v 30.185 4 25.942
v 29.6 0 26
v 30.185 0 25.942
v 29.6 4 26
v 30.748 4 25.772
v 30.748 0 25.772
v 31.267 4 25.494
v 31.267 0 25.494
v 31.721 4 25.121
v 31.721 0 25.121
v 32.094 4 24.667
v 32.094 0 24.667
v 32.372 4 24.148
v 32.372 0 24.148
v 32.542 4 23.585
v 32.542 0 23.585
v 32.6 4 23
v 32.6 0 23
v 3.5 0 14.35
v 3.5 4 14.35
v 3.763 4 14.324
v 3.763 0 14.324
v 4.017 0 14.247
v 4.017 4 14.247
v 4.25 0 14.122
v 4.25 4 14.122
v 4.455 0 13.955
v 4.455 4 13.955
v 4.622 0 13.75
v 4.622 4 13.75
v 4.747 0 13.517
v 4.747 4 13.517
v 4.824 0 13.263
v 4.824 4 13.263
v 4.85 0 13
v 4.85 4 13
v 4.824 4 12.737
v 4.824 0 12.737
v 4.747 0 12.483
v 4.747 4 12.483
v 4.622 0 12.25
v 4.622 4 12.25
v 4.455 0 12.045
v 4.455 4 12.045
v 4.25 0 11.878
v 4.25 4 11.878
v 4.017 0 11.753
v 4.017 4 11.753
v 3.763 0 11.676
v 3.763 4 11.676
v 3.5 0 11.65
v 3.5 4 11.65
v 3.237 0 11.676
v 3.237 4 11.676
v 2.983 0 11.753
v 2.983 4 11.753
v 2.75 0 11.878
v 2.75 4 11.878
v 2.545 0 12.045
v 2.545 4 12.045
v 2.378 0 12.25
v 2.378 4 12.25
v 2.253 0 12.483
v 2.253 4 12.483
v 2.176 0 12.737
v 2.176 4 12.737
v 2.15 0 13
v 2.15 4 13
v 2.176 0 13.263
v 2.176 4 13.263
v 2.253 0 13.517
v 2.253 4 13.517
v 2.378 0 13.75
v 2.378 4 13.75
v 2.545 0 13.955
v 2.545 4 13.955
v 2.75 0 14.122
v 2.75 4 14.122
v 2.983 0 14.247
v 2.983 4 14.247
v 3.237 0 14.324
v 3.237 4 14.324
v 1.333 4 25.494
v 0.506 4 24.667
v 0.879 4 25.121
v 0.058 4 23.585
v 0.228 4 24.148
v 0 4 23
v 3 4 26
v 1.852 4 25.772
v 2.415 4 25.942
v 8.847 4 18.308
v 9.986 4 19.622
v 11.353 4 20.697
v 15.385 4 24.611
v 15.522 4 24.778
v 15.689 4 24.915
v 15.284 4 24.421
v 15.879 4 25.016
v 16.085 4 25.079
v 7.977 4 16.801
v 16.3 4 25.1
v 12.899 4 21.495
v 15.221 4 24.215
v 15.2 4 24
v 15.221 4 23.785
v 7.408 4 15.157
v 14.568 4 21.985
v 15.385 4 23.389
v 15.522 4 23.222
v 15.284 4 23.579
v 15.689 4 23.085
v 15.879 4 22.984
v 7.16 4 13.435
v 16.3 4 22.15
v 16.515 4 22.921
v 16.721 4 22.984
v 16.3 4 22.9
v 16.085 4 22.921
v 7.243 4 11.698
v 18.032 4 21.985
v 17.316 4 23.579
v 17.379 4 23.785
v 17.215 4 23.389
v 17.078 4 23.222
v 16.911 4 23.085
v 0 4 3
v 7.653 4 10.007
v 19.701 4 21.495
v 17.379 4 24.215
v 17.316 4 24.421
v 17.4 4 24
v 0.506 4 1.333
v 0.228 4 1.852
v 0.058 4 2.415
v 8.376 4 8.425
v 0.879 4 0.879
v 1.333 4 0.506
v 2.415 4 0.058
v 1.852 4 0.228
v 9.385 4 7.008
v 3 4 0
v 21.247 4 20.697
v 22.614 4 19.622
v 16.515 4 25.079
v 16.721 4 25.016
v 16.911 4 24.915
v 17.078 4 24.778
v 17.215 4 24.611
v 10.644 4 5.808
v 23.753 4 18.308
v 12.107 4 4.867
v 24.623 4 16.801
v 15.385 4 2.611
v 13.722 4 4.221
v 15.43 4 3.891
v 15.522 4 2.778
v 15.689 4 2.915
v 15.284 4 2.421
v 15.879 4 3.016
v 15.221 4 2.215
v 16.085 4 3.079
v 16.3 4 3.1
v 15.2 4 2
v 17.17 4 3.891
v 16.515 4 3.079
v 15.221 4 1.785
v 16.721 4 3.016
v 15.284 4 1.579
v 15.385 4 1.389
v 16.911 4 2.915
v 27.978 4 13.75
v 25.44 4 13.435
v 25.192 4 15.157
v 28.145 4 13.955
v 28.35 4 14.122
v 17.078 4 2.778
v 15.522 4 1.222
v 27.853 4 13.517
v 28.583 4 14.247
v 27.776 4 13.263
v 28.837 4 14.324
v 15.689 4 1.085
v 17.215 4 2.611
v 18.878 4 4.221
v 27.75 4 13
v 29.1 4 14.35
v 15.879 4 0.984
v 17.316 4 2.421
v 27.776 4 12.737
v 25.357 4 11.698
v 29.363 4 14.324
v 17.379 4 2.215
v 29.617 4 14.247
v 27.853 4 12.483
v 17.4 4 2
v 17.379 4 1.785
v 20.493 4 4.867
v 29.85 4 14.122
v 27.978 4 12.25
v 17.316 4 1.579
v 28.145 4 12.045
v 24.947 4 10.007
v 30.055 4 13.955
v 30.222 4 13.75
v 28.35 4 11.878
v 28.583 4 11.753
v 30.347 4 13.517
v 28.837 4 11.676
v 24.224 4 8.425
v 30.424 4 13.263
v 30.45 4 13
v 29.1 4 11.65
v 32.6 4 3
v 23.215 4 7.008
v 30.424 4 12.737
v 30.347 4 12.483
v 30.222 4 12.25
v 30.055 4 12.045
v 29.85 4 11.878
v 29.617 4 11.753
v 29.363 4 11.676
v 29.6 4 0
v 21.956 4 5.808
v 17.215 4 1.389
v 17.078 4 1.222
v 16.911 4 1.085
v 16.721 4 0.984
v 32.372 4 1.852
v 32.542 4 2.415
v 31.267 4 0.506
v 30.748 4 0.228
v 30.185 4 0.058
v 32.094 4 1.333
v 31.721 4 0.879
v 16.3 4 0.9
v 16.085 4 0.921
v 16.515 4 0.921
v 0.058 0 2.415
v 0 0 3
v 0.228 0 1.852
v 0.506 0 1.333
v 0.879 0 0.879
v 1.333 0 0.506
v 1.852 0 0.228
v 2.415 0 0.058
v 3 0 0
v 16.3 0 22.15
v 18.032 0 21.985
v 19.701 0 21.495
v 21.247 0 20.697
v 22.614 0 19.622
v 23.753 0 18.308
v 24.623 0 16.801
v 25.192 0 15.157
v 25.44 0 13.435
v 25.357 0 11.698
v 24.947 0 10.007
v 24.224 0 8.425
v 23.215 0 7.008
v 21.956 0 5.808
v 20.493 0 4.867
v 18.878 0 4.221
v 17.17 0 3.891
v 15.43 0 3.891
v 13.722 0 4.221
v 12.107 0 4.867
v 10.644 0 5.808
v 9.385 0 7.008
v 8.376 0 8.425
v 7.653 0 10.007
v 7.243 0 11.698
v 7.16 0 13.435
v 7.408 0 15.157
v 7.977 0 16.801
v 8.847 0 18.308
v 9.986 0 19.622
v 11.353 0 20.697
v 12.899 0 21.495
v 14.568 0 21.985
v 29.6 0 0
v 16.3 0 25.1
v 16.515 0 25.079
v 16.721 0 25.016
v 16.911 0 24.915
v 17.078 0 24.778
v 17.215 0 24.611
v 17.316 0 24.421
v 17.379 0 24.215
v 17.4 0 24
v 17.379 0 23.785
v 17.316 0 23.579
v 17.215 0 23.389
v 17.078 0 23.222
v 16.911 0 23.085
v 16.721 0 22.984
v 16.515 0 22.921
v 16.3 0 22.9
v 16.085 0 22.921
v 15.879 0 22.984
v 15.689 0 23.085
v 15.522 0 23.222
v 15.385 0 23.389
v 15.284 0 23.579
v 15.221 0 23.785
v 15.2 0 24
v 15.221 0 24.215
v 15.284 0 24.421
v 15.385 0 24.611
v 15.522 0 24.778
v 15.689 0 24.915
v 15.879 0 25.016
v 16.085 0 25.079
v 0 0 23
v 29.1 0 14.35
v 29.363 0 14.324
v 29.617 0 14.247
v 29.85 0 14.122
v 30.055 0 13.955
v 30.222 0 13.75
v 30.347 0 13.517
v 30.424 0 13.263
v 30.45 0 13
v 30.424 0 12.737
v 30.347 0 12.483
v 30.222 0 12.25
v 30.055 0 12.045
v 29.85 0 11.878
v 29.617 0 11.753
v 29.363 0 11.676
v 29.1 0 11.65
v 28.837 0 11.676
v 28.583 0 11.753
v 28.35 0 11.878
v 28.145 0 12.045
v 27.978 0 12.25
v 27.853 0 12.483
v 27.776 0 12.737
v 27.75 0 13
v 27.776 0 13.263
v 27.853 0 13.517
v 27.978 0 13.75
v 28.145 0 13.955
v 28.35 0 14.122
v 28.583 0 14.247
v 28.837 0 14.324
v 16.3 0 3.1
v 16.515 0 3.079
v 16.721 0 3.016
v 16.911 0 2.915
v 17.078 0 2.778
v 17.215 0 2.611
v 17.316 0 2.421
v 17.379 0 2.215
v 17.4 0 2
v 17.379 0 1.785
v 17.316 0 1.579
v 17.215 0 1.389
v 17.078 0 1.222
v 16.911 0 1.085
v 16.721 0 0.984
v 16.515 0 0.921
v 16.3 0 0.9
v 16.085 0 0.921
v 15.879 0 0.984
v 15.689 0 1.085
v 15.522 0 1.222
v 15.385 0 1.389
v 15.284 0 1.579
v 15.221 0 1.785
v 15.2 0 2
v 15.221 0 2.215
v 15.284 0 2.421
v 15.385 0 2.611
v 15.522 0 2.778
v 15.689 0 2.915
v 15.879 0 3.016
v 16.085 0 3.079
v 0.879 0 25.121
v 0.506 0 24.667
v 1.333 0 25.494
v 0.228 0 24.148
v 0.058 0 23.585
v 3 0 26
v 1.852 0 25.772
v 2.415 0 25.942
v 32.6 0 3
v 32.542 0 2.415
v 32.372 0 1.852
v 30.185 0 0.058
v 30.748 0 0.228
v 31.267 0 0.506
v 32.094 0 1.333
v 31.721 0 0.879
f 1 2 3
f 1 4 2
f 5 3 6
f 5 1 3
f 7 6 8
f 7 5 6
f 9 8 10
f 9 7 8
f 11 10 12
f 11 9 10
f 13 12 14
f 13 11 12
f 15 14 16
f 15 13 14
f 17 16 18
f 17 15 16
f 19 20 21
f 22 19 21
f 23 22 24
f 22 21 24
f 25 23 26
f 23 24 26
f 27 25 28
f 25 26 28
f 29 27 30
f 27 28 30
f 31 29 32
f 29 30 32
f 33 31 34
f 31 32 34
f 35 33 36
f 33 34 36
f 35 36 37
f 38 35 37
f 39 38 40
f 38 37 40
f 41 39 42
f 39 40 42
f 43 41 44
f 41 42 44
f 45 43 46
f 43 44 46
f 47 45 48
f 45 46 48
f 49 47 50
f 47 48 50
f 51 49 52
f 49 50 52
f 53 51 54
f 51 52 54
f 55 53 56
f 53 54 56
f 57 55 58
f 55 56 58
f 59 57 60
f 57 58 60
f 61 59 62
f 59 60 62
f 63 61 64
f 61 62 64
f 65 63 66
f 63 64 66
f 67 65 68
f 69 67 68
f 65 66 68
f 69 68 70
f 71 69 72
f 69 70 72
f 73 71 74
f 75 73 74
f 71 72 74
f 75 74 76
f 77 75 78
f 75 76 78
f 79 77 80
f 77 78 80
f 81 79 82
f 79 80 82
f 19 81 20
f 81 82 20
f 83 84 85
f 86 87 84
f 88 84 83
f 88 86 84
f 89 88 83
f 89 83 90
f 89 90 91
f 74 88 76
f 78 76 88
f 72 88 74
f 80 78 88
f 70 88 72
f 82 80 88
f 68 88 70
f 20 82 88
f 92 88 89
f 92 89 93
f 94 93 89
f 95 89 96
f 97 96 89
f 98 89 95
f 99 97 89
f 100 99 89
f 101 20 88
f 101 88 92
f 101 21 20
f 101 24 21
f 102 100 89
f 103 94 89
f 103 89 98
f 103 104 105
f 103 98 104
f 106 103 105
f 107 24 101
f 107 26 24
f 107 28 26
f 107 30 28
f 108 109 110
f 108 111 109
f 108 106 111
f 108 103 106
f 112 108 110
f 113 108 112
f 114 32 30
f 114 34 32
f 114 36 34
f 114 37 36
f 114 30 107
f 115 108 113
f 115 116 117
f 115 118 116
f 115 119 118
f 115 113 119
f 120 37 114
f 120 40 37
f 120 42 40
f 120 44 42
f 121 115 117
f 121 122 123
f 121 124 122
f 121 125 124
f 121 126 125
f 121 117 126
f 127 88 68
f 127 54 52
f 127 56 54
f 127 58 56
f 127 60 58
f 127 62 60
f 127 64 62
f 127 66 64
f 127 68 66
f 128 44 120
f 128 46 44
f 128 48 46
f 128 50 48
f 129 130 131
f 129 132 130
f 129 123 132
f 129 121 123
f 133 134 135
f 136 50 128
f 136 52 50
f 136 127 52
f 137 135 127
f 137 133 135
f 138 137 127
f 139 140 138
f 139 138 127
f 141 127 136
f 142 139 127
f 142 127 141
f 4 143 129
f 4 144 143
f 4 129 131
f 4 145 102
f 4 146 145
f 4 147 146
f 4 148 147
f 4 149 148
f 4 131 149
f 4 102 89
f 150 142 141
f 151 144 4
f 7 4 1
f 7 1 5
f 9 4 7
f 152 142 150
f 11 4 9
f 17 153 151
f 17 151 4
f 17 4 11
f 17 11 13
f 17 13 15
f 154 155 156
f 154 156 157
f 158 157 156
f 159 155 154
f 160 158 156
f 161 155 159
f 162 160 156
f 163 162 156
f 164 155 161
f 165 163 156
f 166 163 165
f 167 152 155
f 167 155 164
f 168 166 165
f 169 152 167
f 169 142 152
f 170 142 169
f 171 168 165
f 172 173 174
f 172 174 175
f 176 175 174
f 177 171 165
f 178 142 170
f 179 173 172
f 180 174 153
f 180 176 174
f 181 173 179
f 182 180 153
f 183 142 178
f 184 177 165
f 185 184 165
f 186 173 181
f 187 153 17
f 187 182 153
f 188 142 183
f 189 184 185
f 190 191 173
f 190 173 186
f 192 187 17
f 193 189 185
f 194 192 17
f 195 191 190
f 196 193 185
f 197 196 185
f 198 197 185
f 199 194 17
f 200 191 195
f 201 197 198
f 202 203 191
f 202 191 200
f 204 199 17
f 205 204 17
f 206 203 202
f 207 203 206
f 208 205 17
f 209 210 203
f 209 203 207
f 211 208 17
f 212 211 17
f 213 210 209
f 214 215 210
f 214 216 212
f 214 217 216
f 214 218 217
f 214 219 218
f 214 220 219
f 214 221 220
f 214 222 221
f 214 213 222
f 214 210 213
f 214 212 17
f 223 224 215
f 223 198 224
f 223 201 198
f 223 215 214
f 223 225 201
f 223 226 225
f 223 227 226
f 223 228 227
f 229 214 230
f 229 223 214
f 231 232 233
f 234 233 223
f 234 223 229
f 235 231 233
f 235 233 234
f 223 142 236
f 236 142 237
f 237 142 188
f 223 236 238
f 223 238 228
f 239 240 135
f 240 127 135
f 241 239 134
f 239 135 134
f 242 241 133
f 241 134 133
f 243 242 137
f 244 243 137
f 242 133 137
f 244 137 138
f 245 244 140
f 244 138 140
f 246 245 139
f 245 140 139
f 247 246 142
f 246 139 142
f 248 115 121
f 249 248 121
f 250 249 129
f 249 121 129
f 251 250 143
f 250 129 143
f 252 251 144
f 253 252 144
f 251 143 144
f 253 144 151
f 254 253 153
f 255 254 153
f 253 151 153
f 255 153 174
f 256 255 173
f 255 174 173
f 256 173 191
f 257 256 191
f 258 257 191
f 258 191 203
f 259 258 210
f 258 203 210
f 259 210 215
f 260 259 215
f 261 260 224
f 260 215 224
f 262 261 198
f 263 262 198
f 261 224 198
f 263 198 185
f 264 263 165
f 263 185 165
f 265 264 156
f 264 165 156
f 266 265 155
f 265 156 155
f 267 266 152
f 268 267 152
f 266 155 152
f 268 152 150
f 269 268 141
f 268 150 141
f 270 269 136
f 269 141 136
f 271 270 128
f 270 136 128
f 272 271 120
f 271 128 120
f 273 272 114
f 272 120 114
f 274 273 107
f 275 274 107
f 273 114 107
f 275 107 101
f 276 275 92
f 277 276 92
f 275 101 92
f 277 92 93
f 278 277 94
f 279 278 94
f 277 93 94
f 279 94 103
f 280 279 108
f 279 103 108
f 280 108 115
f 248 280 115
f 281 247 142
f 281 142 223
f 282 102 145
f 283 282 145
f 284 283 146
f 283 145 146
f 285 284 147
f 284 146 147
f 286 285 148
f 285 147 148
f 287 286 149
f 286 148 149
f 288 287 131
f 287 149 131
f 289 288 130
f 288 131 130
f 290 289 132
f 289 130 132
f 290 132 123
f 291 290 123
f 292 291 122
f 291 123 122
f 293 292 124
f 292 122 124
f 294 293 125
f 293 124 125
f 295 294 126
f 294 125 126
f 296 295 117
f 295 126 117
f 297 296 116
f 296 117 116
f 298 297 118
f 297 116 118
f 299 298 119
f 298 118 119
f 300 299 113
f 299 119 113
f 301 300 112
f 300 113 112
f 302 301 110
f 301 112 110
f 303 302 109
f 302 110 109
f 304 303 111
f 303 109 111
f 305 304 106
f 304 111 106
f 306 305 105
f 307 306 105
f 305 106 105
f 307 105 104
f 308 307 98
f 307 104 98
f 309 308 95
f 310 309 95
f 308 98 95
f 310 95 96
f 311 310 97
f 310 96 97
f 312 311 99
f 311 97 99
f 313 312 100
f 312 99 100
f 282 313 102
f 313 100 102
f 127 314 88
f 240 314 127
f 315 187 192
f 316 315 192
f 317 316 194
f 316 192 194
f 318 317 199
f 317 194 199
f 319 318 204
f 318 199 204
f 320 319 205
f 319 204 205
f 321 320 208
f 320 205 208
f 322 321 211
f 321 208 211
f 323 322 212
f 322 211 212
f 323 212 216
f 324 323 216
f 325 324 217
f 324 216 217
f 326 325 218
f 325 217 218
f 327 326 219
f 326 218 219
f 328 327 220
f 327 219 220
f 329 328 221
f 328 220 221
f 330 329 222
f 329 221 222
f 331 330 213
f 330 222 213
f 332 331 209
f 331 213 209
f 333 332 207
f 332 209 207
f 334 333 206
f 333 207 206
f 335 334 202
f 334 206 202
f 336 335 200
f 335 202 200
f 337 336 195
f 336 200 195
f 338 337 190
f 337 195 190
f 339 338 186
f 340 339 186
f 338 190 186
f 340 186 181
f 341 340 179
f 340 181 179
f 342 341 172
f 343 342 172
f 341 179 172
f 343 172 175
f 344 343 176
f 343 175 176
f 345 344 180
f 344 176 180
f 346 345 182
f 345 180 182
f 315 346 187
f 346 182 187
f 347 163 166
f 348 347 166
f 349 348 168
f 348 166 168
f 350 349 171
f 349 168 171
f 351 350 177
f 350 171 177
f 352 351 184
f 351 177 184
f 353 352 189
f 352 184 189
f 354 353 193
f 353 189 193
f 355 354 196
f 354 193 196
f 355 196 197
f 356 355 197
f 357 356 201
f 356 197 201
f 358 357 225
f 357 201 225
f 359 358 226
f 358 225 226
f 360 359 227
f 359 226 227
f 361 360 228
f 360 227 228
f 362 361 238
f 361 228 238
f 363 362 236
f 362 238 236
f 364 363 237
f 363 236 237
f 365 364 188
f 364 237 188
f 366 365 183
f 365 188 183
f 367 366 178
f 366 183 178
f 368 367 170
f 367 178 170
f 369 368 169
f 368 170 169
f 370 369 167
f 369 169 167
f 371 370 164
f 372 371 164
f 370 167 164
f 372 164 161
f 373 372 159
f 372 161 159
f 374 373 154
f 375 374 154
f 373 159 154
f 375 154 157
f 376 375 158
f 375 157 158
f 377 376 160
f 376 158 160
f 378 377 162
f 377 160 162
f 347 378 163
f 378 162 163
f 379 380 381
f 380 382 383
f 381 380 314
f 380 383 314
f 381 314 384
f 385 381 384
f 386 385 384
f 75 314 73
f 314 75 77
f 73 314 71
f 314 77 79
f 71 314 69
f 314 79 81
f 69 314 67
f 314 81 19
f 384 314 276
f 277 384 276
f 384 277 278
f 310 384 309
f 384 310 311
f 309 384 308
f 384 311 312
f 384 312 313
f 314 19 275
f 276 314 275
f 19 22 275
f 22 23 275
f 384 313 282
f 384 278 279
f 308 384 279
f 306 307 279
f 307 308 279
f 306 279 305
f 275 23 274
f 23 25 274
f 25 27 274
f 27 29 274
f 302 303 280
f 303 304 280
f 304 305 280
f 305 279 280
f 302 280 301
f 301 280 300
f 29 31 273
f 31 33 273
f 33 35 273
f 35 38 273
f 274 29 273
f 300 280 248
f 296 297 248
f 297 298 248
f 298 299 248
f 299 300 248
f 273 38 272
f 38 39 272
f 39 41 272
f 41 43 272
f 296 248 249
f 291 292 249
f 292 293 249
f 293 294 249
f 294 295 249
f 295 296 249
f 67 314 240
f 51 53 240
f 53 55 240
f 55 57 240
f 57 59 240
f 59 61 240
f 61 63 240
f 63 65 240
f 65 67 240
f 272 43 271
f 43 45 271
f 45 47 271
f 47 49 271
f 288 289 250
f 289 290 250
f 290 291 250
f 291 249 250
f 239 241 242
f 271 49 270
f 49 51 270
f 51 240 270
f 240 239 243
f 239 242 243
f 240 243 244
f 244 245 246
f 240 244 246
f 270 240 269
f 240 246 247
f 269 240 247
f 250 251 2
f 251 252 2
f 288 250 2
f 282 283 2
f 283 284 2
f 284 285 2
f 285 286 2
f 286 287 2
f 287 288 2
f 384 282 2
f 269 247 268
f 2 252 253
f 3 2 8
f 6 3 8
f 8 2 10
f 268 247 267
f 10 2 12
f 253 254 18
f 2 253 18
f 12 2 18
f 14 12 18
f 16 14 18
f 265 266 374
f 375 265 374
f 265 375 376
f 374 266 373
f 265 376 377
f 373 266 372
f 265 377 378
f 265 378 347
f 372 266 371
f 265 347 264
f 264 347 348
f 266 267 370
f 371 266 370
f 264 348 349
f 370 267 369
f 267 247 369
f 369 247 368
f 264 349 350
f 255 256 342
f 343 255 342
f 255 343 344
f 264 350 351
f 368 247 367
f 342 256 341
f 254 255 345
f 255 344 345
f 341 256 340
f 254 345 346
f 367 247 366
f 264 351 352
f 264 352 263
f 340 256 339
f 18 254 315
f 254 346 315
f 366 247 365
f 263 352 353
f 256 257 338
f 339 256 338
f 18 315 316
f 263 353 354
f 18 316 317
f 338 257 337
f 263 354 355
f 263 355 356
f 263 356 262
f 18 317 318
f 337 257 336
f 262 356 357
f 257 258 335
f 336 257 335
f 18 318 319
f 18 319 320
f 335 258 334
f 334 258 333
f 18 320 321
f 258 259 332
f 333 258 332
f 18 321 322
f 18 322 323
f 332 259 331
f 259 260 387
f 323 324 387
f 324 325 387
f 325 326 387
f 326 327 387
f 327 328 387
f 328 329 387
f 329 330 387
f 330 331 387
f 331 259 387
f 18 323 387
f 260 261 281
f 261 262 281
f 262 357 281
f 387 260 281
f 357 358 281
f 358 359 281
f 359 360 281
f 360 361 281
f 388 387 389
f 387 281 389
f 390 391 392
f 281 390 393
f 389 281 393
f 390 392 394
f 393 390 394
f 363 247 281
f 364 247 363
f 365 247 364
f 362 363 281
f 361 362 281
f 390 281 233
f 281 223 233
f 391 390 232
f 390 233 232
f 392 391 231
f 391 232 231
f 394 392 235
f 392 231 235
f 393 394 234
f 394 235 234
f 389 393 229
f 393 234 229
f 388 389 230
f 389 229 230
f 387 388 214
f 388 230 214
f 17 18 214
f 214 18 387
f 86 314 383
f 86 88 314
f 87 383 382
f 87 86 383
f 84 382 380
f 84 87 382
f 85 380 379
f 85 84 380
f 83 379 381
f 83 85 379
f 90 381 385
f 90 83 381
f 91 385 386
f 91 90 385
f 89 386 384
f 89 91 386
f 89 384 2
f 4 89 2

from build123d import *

# Parameters (mm, degrees)
SKETCH1_W           = 32.6
SKETCH1_H           = 26
BOSS_EXTRUDE1_DEPTH = 4
SKETCH2_R           = 9.15
SKETCH2_R_2         = 1.35
SKETCH2_R_3         = 1.1
CUT_EXTRUDE1_DEPTH  = 4
FILLET1_R           = 3


with BuildPart() as part:
    # Sketch1 → Boss-Extrude1 (new body)
    with BuildSketch(Plane(origin=(0, 0, 0), x_dir=(1, 0, 0), z_dir=(0, 1, 0))):
        with Locations((16.3, -13)):
            Rectangle(SKETCH1_W, SKETCH1_H)
    extrude(amount=BOSS_EXTRUDE1_DEPTH)

    # Sketch2 → Cut-Extrude1 (cut)
    with BuildSketch(Plane(origin=(0, 4, 0), x_dir=(1, 0, 0), z_dir=(0, 1, 0))):
        with Locations(Location((16.3, -13, 0), (0, 0, 270))):
            Circle(SKETCH2_R)
        with Locations(Location((3.5, -13, 0), (0, 0, 270))):
            Circle(SKETCH2_R_2)
        with Locations(Location((29.1, -13, 0), (0, 0, 270))):
            Circle(SKETCH2_R_2)
        with Locations(Location((16.3, -2, 0), (0, 0, 270))):
            Circle(SKETCH2_R_3)
        with Locations(Location((16.3, -24, 0), (0, 0, 270))):
            Circle(SKETCH2_R_3)
    extrude(amount=-CUT_EXTRUDE1_DEPTH, mode=Mode.SUBTRACT)

    # Fillet1
    fillet1_edges = [part.edges().sort_by_distance(p)[0] for p in [
        (0, 2, 0),
        (32.6, 2, 0),
        (32.6, 2, 26),
        (0, 2, 26),
    ]]
    fillet(fillet1_edges, radius=FILLET1_R)


solid = part.part
